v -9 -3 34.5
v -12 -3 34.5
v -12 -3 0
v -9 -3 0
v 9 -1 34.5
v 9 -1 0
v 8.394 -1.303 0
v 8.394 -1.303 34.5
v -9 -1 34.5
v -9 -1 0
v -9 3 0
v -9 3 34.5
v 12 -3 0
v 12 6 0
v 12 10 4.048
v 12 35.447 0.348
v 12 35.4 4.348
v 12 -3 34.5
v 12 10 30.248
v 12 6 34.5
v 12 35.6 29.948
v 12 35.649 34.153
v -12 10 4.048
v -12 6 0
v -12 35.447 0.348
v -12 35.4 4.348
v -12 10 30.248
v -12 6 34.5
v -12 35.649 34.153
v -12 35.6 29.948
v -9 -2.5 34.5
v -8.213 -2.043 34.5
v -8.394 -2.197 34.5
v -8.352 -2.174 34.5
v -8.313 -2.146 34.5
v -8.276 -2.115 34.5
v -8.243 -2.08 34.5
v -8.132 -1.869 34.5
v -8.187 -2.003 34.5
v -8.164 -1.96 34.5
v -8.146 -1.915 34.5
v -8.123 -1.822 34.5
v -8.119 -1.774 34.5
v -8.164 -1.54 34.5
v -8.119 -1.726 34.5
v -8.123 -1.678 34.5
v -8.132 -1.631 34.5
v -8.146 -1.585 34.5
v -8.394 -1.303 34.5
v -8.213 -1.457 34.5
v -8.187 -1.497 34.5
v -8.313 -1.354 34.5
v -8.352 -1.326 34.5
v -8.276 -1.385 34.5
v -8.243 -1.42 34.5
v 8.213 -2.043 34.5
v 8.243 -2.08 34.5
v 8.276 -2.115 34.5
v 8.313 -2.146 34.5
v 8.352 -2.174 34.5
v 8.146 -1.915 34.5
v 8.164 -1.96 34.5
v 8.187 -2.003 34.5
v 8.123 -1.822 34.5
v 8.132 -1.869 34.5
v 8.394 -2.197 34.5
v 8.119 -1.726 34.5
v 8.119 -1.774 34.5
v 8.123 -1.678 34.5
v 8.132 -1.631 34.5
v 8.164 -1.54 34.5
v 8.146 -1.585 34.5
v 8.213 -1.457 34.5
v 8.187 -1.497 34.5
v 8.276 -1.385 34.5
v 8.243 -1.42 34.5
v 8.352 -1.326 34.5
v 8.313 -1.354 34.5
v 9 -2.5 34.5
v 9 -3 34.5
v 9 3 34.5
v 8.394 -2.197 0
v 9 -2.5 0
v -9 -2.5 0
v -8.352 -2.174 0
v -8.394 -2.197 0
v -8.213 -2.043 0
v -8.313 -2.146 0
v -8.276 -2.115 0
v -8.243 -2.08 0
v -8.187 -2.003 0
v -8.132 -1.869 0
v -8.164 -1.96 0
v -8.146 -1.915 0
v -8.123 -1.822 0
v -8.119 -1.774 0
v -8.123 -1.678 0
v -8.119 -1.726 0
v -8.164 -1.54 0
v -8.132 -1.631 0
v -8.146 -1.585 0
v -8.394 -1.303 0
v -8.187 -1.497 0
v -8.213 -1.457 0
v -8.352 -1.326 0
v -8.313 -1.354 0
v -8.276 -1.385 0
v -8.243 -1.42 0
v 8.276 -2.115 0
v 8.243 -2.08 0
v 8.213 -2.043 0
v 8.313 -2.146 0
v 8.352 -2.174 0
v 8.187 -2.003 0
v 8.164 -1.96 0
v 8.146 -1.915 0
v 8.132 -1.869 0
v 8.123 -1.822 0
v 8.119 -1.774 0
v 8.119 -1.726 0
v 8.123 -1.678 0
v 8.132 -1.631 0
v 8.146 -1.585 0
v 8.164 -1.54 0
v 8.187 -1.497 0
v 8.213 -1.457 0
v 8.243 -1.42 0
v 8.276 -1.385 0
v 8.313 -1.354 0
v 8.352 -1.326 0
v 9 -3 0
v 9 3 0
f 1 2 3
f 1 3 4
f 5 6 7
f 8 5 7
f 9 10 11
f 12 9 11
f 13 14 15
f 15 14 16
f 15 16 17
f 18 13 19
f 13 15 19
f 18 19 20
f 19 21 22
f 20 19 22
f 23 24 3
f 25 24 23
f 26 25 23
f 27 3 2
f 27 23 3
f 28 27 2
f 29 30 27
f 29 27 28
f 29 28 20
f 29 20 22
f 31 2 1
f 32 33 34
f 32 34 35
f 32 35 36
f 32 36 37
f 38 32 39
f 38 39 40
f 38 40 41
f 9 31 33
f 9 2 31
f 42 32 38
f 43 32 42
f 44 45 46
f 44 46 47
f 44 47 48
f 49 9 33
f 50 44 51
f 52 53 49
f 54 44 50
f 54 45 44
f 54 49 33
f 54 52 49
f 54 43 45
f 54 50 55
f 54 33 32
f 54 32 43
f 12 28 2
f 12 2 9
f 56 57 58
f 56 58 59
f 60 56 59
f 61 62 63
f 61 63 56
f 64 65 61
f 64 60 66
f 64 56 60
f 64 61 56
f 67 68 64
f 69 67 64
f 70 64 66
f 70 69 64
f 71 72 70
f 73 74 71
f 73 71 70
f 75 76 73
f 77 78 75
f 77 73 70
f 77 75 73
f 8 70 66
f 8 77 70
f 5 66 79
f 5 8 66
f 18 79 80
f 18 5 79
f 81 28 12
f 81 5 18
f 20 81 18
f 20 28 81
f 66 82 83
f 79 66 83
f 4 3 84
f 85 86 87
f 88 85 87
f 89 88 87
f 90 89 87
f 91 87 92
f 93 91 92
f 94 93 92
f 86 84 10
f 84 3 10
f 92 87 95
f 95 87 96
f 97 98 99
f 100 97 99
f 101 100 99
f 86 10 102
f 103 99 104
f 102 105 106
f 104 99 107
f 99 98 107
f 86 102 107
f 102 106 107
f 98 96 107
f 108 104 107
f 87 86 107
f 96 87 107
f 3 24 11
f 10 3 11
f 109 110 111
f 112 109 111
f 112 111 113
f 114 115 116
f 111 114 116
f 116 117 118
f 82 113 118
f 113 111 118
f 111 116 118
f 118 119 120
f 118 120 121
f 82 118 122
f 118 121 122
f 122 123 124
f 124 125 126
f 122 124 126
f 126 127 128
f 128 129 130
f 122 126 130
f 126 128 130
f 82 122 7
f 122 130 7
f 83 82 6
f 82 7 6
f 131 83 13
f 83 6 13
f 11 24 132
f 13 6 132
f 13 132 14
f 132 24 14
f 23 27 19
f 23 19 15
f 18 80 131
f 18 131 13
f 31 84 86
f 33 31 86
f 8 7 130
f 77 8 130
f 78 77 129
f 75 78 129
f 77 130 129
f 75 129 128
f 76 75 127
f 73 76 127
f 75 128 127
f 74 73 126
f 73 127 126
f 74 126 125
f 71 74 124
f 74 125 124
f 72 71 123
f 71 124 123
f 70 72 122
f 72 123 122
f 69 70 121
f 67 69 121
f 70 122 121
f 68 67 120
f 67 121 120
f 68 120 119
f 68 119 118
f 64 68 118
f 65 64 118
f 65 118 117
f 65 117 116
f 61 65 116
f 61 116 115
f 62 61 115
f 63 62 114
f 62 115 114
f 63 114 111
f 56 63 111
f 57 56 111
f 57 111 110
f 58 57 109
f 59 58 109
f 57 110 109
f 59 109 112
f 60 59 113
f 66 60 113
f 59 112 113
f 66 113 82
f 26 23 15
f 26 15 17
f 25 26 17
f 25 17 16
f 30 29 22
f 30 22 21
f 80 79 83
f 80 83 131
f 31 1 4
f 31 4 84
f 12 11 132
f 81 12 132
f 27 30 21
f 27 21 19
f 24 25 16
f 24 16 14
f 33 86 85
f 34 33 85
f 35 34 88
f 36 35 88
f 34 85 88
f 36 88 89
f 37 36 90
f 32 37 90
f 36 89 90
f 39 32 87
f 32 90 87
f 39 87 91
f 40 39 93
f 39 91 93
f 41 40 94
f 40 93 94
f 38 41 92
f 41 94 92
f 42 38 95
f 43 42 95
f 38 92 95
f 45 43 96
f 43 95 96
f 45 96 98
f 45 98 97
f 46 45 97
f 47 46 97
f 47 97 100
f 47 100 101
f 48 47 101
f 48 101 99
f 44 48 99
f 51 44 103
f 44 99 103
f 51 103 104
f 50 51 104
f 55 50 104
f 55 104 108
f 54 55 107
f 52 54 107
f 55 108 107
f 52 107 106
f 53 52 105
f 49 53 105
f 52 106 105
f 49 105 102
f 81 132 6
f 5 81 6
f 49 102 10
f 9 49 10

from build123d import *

# Parameters (mm, degrees)
BOSS_EXTRUDE1_DEPTH = 34.5
BOSS_EXTRUDE2_DEPTH = 24


with BuildPart() as part:
    # Sketch2 → Boss-Extrude1 (new body)
    with BuildSketch(Plane.XY):
        with BuildLine():
            Line((-9, 3), (9, 3))
            Line((9, 3), (9, -1))
            Line((9, -1), (8.394427191, -1.302786405))
            ThreePointArc((8.394427191, -1.302786405), (8.118033989, -1.75), (8.394427191, -2.197213595))
            Line((8.394427191, -2.197213595), (9, -2.5))
            Line((9, -2.5), (9, -3))
            Line((9, -3), (12, -3))
            Line((12, -3), (12, 6))
            Line((12, 6), (-12, 6))
            Line((-12, 6), (-12, -3))
            Line((-12, -3), (-9, -3))
            Line((-9, -3), (-9, -2.5))
            Line((-9, -2.5), (-8.394427191, -2.197213595))
            ThreePointArc((-8.394427191, -2.197213595), (-8.118033989, -1.75), (-8.394427191, -1.302786405))
            Line((-8.394427191, -1.302786405), (-9, -1))
            Line((-9, -1), (-9, 3))
        make_face()
    extrude(amount=BOSS_EXTRUDE1_DEPTH)

    # Sketch3 → Boss-Extrude2 (add)
    with BuildSketch(Plane.ZY.offset(12)):
        Polygon((29.947523085, 35.6), (30.247523085, 10), (4.047523085, 10), (4.347523085, 35.4), (0.347802057, 35.4472408), (0, 6), (34.5, 6), (34.152547528, 35.64927763), align=None)
    extrude(amount=-BOSS_EXTRUDE2_DEPTH)


solid = part.part
